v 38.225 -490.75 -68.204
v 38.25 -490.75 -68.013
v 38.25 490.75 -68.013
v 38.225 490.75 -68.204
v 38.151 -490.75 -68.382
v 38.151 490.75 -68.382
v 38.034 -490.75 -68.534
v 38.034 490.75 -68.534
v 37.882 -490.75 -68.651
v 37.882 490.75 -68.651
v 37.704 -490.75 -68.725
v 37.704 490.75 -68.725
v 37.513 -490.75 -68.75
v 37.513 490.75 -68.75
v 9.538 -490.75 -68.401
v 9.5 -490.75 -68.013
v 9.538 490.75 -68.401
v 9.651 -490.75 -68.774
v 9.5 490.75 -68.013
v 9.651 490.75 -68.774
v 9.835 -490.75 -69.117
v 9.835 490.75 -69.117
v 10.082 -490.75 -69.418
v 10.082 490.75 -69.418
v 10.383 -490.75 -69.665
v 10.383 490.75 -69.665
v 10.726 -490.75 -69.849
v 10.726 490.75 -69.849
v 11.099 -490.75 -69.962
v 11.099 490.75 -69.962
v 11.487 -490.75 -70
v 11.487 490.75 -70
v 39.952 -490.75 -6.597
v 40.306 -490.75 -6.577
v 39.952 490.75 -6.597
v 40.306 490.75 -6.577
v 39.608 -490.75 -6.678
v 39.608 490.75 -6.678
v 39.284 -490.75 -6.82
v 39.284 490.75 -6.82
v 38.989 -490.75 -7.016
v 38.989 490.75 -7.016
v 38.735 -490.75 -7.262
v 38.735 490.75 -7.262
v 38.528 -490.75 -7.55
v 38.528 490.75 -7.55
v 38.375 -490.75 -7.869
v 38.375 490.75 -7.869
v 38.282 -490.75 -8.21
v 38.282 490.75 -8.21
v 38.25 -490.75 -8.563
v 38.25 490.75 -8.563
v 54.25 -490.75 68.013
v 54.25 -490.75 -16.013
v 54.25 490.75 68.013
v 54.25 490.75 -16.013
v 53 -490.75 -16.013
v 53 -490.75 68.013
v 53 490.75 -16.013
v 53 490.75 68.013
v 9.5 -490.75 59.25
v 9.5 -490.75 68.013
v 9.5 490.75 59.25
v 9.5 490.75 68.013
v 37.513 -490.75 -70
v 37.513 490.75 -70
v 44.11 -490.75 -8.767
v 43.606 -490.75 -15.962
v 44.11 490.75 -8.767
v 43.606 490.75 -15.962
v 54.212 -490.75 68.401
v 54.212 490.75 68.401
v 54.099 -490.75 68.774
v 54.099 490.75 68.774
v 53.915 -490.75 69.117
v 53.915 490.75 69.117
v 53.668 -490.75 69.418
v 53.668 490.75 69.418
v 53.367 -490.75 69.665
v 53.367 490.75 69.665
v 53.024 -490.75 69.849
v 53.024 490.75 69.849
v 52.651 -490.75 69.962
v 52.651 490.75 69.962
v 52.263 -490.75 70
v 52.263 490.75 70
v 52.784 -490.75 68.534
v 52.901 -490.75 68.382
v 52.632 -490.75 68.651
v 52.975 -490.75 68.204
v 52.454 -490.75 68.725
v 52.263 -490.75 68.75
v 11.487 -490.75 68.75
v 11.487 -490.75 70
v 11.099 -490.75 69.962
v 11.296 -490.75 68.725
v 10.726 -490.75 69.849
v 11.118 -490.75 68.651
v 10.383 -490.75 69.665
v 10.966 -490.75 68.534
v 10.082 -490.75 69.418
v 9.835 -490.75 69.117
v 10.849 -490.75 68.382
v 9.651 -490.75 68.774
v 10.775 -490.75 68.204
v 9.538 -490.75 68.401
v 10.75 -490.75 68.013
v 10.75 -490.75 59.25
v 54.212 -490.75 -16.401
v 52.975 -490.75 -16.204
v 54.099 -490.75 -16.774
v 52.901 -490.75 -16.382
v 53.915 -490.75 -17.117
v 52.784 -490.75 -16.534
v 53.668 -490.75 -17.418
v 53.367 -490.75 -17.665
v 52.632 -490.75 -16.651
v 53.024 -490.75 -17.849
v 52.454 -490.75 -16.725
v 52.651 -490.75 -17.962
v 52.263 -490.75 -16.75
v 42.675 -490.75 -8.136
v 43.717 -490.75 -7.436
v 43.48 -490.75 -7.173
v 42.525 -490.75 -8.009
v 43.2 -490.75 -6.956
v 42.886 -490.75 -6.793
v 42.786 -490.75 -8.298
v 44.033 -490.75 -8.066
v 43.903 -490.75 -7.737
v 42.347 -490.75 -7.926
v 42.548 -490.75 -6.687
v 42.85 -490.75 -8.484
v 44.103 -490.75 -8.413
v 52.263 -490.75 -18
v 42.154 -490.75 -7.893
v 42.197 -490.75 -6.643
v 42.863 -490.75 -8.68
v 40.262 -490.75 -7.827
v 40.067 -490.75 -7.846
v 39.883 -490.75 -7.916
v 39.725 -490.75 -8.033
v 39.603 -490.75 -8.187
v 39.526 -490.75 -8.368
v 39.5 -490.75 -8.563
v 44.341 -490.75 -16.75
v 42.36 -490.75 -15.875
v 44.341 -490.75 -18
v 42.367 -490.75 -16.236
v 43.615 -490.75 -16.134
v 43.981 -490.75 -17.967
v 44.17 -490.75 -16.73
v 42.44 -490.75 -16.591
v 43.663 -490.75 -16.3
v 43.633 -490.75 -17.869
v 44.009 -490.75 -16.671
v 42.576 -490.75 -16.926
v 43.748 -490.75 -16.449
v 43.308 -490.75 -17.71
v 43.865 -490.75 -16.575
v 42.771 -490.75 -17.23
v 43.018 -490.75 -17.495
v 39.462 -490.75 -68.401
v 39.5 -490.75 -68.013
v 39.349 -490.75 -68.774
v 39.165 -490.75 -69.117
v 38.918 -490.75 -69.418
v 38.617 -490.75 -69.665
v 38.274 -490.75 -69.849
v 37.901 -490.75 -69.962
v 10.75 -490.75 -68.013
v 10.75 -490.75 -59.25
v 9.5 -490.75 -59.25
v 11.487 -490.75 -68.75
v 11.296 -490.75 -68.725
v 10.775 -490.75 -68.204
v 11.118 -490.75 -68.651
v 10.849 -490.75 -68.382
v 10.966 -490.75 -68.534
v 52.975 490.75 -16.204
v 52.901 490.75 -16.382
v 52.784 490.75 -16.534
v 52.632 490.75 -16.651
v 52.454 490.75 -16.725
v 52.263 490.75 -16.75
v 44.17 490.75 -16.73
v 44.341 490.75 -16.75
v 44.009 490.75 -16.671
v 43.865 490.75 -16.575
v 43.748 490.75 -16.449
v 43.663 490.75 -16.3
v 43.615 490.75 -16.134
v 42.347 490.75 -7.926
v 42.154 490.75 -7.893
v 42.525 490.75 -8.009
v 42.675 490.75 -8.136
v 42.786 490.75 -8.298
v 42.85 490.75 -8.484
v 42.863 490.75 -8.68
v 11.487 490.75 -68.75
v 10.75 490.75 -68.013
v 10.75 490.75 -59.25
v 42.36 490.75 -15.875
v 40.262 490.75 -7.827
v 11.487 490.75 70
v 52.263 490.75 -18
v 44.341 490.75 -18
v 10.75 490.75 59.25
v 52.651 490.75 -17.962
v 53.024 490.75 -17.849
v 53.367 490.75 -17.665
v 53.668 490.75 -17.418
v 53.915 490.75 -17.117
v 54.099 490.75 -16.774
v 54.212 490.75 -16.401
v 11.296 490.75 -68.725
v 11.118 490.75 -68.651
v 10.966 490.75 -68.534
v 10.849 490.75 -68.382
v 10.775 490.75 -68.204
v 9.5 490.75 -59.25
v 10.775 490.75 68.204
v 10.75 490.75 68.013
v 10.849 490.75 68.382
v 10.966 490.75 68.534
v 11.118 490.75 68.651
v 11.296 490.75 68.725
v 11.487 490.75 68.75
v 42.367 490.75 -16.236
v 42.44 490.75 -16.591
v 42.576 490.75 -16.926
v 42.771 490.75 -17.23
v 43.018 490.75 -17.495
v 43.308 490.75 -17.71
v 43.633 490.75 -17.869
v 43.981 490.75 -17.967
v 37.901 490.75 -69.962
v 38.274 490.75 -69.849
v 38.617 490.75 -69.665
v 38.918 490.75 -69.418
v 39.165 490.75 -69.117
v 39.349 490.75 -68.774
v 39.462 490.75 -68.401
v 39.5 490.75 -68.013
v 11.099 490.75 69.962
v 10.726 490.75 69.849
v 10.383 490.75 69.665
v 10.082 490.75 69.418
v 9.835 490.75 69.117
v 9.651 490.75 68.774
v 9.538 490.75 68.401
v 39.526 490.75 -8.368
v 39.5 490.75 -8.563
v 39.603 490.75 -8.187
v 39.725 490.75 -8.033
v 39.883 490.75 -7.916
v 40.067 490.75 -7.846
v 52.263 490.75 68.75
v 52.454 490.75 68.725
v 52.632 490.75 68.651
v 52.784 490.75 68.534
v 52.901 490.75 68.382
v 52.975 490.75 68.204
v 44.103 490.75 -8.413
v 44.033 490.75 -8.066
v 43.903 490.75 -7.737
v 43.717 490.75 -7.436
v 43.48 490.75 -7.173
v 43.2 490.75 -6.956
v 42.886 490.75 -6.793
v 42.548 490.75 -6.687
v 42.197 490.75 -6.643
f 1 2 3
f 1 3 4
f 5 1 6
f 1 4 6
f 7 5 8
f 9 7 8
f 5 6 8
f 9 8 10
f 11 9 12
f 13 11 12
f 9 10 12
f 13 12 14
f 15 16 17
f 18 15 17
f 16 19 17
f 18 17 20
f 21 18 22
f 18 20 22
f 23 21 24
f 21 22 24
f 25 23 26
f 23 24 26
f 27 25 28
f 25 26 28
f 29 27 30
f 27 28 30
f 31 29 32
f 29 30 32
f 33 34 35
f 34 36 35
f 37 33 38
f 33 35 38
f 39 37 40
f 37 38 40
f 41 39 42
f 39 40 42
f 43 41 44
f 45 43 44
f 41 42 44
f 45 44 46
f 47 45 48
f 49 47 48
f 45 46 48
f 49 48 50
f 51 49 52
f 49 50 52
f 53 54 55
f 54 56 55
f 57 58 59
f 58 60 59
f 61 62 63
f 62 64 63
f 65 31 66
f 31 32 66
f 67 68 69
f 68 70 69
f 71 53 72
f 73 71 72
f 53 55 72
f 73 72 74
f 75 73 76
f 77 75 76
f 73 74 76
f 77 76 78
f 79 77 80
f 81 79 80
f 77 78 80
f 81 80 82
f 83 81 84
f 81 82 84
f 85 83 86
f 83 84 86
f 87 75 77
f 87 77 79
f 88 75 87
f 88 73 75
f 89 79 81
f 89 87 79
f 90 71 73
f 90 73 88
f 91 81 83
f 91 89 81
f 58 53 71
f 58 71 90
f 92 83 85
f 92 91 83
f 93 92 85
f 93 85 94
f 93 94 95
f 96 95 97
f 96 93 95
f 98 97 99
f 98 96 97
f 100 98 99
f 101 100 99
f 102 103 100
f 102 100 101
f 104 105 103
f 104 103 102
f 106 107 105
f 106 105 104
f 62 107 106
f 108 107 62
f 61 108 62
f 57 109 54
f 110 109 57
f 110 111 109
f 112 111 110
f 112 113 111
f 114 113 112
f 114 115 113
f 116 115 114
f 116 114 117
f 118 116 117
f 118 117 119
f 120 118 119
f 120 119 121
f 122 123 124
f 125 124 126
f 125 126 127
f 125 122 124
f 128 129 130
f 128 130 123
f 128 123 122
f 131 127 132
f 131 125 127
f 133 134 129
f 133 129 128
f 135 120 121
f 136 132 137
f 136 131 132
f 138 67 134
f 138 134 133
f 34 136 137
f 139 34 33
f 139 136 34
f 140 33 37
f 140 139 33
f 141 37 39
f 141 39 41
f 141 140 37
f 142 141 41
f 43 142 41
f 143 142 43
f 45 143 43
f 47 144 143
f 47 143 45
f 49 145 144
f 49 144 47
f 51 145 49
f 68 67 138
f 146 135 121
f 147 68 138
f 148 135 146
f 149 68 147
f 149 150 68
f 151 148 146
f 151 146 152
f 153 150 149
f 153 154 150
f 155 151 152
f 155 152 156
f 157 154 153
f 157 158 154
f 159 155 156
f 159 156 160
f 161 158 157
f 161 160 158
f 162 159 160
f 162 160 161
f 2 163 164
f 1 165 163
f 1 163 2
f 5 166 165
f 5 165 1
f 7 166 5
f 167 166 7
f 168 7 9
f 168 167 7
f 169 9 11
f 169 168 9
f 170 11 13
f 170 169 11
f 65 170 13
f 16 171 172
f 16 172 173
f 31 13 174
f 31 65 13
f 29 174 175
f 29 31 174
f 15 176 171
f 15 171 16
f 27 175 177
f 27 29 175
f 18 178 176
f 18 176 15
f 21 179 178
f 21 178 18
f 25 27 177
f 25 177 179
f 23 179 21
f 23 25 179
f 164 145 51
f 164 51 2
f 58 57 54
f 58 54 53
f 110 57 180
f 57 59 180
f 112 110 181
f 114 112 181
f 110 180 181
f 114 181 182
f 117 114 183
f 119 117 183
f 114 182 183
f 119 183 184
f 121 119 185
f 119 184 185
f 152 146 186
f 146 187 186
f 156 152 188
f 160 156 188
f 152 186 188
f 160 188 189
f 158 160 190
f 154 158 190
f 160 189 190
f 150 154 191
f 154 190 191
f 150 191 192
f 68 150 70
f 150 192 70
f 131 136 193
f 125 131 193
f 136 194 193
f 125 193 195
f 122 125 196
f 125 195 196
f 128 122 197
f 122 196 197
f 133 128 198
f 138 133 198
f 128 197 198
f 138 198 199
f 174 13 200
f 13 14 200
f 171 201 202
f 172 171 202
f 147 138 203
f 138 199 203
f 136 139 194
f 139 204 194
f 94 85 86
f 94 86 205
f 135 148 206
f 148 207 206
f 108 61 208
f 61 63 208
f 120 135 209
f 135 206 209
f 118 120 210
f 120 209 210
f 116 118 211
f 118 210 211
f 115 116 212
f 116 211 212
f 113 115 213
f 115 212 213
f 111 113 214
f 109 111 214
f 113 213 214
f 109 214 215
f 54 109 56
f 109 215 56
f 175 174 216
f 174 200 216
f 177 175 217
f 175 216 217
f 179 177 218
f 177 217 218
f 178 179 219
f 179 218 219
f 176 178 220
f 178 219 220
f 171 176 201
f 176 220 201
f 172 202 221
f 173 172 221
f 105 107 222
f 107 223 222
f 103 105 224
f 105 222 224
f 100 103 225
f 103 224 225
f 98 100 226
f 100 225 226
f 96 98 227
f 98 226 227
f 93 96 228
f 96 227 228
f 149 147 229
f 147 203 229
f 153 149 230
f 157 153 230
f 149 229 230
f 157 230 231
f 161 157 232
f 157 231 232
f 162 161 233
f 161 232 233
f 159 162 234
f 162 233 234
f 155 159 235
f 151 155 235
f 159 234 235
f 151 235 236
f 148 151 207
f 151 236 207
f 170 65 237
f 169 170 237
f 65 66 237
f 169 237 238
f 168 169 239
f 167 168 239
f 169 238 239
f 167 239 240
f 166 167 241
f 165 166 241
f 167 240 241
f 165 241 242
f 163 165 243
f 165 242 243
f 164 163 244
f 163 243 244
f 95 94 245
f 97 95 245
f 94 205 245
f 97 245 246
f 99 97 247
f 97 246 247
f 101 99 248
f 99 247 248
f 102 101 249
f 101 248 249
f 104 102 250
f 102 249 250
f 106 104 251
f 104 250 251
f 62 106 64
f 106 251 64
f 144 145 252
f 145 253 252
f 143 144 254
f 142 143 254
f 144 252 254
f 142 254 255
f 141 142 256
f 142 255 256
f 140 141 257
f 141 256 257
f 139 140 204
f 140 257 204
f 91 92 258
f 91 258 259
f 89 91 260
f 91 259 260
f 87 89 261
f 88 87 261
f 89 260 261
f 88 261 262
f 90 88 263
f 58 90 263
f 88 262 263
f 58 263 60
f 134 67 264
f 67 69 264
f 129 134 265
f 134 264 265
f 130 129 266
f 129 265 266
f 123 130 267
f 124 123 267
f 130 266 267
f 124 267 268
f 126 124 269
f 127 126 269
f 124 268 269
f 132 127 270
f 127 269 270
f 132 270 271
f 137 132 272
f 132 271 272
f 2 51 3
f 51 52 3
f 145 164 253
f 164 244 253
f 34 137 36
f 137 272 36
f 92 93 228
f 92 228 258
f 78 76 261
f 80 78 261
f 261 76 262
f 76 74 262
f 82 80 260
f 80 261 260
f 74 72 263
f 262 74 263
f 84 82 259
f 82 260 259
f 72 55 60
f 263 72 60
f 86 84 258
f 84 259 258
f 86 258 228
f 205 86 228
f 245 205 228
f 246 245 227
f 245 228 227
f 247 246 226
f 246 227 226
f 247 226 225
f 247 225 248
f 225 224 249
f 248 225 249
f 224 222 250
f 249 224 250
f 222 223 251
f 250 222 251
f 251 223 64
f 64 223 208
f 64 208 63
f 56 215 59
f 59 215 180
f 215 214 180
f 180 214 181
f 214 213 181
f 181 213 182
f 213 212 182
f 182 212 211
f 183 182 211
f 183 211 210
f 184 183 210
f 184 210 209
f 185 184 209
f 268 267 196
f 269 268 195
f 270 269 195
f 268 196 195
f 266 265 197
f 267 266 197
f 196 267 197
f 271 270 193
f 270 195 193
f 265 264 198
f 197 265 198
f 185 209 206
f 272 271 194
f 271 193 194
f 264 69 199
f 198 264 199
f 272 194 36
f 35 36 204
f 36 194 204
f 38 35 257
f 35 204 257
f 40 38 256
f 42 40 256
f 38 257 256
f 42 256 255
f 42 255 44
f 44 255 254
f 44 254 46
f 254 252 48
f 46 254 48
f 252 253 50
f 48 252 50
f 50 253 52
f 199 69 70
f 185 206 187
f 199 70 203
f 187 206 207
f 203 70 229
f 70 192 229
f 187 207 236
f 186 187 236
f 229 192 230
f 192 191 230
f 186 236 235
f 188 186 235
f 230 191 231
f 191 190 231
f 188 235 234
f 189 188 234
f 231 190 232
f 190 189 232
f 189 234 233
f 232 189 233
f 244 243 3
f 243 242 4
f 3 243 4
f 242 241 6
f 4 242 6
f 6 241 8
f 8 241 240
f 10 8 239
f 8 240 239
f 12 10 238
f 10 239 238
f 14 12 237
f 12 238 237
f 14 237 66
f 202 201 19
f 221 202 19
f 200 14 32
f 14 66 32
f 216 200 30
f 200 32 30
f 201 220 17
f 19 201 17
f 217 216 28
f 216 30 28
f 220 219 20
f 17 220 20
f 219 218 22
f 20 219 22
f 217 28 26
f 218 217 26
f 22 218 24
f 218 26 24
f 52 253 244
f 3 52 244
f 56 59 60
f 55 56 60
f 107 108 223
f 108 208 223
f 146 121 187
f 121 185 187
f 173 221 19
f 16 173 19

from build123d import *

# Parameters (mm, degrees)
BASE_FLANGE1_DEPTH = 490.75


# Sheet-metal steps are written as plain solids
with BuildPart() as part:
    # Sketch1 → Base-Flange1 (new, symmetric)
    with BuildSketch(Plane(origin=(0, 0, 0), x_dir=(1, 0, 0), z_dir=(0, 1, 0))):
        with BuildLine():
            Line((9.5, 59.25), (9.5, 68.0134))
            ThreePointArc((9.5, 68.0134), (10.081861668, 69.418138332), (11.4866, 70))
            Line((11.4866, 70), (37.5134, 70))
            ThreePointArc((37.5134, 70), (38.918138332, 69.418138332), (39.5, 68.0134))
            Line((39.5, 68.0134), (39.5, 23))
            Line((39.5, 23), (39.5, 8.562771629))
            ThreePointArc((39.5, 8.562771629), (39.724914644, 8.032905932), (40.262306969, 7.826620346))
            Line((40.262306969, 7.826620346), (42.153527557, 7.892663224))
            ThreePointArc((42.153527557, 7.892663224), (42.675221066, 8.135932903), (42.862626267, 8.680197126))
            Line((42.862626267, 8.680197126), (42.359529101, 15.874821789))
            ThreePointArc((42.359529101, 15.874821789), (42.88838258, 17.368257942), (44.341289843, 18))
            Line((44.341289843, 18), (52.2634, 18))
            ThreePointArc((52.2634, 18), (53.668138332, 17.418138332), (54.25, 16.0134))
            Line((54.25, 16.0134), (54.25, -23))
            Line((54.25, -23), (54.25, -68.0134))
            ThreePointArc((54.25, -68.0134), (53.668138332, -69.418138332), (52.2634, -70))
            Line((52.2634, -70), (39.5, -70))
            Line((39.5, -70), (11.4866, -70))
            ThreePointArc((11.4866, -70), (10.081861668, -69.418138332), (9.5, -68.0134))
            Line((9.5, -68.0134), (9.5, -59.25))
            Line((9.5, -59.25), (10.75, -59.25))
            Line((10.75, -59.25), (10.75, -68.0134))
            ThreePointArc((10.75, -68.0134), (10.965745145, -68.534254855), (11.4866, -68.75))
            Line((11.4866, -68.75), (39.5, -68.75))
            Line((39.5, -68.75), (52.2634, -68.75))
            ThreePointArc((52.2634, -68.75), (52.784254855, -68.534254855), (53, -68.0134))
            Line((53, -68.0134), (53, -23))
            Line((53, -23), (53, 16.0134))
            ThreePointArc((53, 16.0134), (52.784254855, 16.534254855), (52.2634, 16.75))
            Line((52.2634, 16.75), (44.341289843, 16.75))
            ThreePointArc((44.341289843, 16.75), (43.802574707, 16.515759992), (43.606484164, 15.962017381))
            Line((43.606484164, 15.962017381), (44.10958133, 8.767392718))
            ThreePointArc((44.10958133, 8.767392718), (43.604152098, 7.299519645), (42.197151928, 6.64342469))
            Line((42.197151928, 6.64342469), (40.30593134, 6.577381812))
            ThreePointArc((40.30593134, 6.577381812), (38.856591681, 7.133731182), (38.25, 8.562771629))
            Line((38.25, 8.562771629), (38.25, 23))
            Line((38.25, 23), (38.25, 68.0134))
            ThreePointArc((38.25, 68.0134), (38.034254855, 68.534254855), (37.5134, 68.75))
            Line((37.5134, 68.75), (11.4866, 68.75))
            ThreePointArc((11.4866, 68.75), (10.965745145, 68.534254855), (10.75, 68.0134))
            Line((10.75, 68.0134), (10.75, 59.25))
            Line((10.75, 59.25), (9.5, 59.25))
        make_face()
    extrude(amount=BASE_FLANGE1_DEPTH, both=True)


solid = part.part
